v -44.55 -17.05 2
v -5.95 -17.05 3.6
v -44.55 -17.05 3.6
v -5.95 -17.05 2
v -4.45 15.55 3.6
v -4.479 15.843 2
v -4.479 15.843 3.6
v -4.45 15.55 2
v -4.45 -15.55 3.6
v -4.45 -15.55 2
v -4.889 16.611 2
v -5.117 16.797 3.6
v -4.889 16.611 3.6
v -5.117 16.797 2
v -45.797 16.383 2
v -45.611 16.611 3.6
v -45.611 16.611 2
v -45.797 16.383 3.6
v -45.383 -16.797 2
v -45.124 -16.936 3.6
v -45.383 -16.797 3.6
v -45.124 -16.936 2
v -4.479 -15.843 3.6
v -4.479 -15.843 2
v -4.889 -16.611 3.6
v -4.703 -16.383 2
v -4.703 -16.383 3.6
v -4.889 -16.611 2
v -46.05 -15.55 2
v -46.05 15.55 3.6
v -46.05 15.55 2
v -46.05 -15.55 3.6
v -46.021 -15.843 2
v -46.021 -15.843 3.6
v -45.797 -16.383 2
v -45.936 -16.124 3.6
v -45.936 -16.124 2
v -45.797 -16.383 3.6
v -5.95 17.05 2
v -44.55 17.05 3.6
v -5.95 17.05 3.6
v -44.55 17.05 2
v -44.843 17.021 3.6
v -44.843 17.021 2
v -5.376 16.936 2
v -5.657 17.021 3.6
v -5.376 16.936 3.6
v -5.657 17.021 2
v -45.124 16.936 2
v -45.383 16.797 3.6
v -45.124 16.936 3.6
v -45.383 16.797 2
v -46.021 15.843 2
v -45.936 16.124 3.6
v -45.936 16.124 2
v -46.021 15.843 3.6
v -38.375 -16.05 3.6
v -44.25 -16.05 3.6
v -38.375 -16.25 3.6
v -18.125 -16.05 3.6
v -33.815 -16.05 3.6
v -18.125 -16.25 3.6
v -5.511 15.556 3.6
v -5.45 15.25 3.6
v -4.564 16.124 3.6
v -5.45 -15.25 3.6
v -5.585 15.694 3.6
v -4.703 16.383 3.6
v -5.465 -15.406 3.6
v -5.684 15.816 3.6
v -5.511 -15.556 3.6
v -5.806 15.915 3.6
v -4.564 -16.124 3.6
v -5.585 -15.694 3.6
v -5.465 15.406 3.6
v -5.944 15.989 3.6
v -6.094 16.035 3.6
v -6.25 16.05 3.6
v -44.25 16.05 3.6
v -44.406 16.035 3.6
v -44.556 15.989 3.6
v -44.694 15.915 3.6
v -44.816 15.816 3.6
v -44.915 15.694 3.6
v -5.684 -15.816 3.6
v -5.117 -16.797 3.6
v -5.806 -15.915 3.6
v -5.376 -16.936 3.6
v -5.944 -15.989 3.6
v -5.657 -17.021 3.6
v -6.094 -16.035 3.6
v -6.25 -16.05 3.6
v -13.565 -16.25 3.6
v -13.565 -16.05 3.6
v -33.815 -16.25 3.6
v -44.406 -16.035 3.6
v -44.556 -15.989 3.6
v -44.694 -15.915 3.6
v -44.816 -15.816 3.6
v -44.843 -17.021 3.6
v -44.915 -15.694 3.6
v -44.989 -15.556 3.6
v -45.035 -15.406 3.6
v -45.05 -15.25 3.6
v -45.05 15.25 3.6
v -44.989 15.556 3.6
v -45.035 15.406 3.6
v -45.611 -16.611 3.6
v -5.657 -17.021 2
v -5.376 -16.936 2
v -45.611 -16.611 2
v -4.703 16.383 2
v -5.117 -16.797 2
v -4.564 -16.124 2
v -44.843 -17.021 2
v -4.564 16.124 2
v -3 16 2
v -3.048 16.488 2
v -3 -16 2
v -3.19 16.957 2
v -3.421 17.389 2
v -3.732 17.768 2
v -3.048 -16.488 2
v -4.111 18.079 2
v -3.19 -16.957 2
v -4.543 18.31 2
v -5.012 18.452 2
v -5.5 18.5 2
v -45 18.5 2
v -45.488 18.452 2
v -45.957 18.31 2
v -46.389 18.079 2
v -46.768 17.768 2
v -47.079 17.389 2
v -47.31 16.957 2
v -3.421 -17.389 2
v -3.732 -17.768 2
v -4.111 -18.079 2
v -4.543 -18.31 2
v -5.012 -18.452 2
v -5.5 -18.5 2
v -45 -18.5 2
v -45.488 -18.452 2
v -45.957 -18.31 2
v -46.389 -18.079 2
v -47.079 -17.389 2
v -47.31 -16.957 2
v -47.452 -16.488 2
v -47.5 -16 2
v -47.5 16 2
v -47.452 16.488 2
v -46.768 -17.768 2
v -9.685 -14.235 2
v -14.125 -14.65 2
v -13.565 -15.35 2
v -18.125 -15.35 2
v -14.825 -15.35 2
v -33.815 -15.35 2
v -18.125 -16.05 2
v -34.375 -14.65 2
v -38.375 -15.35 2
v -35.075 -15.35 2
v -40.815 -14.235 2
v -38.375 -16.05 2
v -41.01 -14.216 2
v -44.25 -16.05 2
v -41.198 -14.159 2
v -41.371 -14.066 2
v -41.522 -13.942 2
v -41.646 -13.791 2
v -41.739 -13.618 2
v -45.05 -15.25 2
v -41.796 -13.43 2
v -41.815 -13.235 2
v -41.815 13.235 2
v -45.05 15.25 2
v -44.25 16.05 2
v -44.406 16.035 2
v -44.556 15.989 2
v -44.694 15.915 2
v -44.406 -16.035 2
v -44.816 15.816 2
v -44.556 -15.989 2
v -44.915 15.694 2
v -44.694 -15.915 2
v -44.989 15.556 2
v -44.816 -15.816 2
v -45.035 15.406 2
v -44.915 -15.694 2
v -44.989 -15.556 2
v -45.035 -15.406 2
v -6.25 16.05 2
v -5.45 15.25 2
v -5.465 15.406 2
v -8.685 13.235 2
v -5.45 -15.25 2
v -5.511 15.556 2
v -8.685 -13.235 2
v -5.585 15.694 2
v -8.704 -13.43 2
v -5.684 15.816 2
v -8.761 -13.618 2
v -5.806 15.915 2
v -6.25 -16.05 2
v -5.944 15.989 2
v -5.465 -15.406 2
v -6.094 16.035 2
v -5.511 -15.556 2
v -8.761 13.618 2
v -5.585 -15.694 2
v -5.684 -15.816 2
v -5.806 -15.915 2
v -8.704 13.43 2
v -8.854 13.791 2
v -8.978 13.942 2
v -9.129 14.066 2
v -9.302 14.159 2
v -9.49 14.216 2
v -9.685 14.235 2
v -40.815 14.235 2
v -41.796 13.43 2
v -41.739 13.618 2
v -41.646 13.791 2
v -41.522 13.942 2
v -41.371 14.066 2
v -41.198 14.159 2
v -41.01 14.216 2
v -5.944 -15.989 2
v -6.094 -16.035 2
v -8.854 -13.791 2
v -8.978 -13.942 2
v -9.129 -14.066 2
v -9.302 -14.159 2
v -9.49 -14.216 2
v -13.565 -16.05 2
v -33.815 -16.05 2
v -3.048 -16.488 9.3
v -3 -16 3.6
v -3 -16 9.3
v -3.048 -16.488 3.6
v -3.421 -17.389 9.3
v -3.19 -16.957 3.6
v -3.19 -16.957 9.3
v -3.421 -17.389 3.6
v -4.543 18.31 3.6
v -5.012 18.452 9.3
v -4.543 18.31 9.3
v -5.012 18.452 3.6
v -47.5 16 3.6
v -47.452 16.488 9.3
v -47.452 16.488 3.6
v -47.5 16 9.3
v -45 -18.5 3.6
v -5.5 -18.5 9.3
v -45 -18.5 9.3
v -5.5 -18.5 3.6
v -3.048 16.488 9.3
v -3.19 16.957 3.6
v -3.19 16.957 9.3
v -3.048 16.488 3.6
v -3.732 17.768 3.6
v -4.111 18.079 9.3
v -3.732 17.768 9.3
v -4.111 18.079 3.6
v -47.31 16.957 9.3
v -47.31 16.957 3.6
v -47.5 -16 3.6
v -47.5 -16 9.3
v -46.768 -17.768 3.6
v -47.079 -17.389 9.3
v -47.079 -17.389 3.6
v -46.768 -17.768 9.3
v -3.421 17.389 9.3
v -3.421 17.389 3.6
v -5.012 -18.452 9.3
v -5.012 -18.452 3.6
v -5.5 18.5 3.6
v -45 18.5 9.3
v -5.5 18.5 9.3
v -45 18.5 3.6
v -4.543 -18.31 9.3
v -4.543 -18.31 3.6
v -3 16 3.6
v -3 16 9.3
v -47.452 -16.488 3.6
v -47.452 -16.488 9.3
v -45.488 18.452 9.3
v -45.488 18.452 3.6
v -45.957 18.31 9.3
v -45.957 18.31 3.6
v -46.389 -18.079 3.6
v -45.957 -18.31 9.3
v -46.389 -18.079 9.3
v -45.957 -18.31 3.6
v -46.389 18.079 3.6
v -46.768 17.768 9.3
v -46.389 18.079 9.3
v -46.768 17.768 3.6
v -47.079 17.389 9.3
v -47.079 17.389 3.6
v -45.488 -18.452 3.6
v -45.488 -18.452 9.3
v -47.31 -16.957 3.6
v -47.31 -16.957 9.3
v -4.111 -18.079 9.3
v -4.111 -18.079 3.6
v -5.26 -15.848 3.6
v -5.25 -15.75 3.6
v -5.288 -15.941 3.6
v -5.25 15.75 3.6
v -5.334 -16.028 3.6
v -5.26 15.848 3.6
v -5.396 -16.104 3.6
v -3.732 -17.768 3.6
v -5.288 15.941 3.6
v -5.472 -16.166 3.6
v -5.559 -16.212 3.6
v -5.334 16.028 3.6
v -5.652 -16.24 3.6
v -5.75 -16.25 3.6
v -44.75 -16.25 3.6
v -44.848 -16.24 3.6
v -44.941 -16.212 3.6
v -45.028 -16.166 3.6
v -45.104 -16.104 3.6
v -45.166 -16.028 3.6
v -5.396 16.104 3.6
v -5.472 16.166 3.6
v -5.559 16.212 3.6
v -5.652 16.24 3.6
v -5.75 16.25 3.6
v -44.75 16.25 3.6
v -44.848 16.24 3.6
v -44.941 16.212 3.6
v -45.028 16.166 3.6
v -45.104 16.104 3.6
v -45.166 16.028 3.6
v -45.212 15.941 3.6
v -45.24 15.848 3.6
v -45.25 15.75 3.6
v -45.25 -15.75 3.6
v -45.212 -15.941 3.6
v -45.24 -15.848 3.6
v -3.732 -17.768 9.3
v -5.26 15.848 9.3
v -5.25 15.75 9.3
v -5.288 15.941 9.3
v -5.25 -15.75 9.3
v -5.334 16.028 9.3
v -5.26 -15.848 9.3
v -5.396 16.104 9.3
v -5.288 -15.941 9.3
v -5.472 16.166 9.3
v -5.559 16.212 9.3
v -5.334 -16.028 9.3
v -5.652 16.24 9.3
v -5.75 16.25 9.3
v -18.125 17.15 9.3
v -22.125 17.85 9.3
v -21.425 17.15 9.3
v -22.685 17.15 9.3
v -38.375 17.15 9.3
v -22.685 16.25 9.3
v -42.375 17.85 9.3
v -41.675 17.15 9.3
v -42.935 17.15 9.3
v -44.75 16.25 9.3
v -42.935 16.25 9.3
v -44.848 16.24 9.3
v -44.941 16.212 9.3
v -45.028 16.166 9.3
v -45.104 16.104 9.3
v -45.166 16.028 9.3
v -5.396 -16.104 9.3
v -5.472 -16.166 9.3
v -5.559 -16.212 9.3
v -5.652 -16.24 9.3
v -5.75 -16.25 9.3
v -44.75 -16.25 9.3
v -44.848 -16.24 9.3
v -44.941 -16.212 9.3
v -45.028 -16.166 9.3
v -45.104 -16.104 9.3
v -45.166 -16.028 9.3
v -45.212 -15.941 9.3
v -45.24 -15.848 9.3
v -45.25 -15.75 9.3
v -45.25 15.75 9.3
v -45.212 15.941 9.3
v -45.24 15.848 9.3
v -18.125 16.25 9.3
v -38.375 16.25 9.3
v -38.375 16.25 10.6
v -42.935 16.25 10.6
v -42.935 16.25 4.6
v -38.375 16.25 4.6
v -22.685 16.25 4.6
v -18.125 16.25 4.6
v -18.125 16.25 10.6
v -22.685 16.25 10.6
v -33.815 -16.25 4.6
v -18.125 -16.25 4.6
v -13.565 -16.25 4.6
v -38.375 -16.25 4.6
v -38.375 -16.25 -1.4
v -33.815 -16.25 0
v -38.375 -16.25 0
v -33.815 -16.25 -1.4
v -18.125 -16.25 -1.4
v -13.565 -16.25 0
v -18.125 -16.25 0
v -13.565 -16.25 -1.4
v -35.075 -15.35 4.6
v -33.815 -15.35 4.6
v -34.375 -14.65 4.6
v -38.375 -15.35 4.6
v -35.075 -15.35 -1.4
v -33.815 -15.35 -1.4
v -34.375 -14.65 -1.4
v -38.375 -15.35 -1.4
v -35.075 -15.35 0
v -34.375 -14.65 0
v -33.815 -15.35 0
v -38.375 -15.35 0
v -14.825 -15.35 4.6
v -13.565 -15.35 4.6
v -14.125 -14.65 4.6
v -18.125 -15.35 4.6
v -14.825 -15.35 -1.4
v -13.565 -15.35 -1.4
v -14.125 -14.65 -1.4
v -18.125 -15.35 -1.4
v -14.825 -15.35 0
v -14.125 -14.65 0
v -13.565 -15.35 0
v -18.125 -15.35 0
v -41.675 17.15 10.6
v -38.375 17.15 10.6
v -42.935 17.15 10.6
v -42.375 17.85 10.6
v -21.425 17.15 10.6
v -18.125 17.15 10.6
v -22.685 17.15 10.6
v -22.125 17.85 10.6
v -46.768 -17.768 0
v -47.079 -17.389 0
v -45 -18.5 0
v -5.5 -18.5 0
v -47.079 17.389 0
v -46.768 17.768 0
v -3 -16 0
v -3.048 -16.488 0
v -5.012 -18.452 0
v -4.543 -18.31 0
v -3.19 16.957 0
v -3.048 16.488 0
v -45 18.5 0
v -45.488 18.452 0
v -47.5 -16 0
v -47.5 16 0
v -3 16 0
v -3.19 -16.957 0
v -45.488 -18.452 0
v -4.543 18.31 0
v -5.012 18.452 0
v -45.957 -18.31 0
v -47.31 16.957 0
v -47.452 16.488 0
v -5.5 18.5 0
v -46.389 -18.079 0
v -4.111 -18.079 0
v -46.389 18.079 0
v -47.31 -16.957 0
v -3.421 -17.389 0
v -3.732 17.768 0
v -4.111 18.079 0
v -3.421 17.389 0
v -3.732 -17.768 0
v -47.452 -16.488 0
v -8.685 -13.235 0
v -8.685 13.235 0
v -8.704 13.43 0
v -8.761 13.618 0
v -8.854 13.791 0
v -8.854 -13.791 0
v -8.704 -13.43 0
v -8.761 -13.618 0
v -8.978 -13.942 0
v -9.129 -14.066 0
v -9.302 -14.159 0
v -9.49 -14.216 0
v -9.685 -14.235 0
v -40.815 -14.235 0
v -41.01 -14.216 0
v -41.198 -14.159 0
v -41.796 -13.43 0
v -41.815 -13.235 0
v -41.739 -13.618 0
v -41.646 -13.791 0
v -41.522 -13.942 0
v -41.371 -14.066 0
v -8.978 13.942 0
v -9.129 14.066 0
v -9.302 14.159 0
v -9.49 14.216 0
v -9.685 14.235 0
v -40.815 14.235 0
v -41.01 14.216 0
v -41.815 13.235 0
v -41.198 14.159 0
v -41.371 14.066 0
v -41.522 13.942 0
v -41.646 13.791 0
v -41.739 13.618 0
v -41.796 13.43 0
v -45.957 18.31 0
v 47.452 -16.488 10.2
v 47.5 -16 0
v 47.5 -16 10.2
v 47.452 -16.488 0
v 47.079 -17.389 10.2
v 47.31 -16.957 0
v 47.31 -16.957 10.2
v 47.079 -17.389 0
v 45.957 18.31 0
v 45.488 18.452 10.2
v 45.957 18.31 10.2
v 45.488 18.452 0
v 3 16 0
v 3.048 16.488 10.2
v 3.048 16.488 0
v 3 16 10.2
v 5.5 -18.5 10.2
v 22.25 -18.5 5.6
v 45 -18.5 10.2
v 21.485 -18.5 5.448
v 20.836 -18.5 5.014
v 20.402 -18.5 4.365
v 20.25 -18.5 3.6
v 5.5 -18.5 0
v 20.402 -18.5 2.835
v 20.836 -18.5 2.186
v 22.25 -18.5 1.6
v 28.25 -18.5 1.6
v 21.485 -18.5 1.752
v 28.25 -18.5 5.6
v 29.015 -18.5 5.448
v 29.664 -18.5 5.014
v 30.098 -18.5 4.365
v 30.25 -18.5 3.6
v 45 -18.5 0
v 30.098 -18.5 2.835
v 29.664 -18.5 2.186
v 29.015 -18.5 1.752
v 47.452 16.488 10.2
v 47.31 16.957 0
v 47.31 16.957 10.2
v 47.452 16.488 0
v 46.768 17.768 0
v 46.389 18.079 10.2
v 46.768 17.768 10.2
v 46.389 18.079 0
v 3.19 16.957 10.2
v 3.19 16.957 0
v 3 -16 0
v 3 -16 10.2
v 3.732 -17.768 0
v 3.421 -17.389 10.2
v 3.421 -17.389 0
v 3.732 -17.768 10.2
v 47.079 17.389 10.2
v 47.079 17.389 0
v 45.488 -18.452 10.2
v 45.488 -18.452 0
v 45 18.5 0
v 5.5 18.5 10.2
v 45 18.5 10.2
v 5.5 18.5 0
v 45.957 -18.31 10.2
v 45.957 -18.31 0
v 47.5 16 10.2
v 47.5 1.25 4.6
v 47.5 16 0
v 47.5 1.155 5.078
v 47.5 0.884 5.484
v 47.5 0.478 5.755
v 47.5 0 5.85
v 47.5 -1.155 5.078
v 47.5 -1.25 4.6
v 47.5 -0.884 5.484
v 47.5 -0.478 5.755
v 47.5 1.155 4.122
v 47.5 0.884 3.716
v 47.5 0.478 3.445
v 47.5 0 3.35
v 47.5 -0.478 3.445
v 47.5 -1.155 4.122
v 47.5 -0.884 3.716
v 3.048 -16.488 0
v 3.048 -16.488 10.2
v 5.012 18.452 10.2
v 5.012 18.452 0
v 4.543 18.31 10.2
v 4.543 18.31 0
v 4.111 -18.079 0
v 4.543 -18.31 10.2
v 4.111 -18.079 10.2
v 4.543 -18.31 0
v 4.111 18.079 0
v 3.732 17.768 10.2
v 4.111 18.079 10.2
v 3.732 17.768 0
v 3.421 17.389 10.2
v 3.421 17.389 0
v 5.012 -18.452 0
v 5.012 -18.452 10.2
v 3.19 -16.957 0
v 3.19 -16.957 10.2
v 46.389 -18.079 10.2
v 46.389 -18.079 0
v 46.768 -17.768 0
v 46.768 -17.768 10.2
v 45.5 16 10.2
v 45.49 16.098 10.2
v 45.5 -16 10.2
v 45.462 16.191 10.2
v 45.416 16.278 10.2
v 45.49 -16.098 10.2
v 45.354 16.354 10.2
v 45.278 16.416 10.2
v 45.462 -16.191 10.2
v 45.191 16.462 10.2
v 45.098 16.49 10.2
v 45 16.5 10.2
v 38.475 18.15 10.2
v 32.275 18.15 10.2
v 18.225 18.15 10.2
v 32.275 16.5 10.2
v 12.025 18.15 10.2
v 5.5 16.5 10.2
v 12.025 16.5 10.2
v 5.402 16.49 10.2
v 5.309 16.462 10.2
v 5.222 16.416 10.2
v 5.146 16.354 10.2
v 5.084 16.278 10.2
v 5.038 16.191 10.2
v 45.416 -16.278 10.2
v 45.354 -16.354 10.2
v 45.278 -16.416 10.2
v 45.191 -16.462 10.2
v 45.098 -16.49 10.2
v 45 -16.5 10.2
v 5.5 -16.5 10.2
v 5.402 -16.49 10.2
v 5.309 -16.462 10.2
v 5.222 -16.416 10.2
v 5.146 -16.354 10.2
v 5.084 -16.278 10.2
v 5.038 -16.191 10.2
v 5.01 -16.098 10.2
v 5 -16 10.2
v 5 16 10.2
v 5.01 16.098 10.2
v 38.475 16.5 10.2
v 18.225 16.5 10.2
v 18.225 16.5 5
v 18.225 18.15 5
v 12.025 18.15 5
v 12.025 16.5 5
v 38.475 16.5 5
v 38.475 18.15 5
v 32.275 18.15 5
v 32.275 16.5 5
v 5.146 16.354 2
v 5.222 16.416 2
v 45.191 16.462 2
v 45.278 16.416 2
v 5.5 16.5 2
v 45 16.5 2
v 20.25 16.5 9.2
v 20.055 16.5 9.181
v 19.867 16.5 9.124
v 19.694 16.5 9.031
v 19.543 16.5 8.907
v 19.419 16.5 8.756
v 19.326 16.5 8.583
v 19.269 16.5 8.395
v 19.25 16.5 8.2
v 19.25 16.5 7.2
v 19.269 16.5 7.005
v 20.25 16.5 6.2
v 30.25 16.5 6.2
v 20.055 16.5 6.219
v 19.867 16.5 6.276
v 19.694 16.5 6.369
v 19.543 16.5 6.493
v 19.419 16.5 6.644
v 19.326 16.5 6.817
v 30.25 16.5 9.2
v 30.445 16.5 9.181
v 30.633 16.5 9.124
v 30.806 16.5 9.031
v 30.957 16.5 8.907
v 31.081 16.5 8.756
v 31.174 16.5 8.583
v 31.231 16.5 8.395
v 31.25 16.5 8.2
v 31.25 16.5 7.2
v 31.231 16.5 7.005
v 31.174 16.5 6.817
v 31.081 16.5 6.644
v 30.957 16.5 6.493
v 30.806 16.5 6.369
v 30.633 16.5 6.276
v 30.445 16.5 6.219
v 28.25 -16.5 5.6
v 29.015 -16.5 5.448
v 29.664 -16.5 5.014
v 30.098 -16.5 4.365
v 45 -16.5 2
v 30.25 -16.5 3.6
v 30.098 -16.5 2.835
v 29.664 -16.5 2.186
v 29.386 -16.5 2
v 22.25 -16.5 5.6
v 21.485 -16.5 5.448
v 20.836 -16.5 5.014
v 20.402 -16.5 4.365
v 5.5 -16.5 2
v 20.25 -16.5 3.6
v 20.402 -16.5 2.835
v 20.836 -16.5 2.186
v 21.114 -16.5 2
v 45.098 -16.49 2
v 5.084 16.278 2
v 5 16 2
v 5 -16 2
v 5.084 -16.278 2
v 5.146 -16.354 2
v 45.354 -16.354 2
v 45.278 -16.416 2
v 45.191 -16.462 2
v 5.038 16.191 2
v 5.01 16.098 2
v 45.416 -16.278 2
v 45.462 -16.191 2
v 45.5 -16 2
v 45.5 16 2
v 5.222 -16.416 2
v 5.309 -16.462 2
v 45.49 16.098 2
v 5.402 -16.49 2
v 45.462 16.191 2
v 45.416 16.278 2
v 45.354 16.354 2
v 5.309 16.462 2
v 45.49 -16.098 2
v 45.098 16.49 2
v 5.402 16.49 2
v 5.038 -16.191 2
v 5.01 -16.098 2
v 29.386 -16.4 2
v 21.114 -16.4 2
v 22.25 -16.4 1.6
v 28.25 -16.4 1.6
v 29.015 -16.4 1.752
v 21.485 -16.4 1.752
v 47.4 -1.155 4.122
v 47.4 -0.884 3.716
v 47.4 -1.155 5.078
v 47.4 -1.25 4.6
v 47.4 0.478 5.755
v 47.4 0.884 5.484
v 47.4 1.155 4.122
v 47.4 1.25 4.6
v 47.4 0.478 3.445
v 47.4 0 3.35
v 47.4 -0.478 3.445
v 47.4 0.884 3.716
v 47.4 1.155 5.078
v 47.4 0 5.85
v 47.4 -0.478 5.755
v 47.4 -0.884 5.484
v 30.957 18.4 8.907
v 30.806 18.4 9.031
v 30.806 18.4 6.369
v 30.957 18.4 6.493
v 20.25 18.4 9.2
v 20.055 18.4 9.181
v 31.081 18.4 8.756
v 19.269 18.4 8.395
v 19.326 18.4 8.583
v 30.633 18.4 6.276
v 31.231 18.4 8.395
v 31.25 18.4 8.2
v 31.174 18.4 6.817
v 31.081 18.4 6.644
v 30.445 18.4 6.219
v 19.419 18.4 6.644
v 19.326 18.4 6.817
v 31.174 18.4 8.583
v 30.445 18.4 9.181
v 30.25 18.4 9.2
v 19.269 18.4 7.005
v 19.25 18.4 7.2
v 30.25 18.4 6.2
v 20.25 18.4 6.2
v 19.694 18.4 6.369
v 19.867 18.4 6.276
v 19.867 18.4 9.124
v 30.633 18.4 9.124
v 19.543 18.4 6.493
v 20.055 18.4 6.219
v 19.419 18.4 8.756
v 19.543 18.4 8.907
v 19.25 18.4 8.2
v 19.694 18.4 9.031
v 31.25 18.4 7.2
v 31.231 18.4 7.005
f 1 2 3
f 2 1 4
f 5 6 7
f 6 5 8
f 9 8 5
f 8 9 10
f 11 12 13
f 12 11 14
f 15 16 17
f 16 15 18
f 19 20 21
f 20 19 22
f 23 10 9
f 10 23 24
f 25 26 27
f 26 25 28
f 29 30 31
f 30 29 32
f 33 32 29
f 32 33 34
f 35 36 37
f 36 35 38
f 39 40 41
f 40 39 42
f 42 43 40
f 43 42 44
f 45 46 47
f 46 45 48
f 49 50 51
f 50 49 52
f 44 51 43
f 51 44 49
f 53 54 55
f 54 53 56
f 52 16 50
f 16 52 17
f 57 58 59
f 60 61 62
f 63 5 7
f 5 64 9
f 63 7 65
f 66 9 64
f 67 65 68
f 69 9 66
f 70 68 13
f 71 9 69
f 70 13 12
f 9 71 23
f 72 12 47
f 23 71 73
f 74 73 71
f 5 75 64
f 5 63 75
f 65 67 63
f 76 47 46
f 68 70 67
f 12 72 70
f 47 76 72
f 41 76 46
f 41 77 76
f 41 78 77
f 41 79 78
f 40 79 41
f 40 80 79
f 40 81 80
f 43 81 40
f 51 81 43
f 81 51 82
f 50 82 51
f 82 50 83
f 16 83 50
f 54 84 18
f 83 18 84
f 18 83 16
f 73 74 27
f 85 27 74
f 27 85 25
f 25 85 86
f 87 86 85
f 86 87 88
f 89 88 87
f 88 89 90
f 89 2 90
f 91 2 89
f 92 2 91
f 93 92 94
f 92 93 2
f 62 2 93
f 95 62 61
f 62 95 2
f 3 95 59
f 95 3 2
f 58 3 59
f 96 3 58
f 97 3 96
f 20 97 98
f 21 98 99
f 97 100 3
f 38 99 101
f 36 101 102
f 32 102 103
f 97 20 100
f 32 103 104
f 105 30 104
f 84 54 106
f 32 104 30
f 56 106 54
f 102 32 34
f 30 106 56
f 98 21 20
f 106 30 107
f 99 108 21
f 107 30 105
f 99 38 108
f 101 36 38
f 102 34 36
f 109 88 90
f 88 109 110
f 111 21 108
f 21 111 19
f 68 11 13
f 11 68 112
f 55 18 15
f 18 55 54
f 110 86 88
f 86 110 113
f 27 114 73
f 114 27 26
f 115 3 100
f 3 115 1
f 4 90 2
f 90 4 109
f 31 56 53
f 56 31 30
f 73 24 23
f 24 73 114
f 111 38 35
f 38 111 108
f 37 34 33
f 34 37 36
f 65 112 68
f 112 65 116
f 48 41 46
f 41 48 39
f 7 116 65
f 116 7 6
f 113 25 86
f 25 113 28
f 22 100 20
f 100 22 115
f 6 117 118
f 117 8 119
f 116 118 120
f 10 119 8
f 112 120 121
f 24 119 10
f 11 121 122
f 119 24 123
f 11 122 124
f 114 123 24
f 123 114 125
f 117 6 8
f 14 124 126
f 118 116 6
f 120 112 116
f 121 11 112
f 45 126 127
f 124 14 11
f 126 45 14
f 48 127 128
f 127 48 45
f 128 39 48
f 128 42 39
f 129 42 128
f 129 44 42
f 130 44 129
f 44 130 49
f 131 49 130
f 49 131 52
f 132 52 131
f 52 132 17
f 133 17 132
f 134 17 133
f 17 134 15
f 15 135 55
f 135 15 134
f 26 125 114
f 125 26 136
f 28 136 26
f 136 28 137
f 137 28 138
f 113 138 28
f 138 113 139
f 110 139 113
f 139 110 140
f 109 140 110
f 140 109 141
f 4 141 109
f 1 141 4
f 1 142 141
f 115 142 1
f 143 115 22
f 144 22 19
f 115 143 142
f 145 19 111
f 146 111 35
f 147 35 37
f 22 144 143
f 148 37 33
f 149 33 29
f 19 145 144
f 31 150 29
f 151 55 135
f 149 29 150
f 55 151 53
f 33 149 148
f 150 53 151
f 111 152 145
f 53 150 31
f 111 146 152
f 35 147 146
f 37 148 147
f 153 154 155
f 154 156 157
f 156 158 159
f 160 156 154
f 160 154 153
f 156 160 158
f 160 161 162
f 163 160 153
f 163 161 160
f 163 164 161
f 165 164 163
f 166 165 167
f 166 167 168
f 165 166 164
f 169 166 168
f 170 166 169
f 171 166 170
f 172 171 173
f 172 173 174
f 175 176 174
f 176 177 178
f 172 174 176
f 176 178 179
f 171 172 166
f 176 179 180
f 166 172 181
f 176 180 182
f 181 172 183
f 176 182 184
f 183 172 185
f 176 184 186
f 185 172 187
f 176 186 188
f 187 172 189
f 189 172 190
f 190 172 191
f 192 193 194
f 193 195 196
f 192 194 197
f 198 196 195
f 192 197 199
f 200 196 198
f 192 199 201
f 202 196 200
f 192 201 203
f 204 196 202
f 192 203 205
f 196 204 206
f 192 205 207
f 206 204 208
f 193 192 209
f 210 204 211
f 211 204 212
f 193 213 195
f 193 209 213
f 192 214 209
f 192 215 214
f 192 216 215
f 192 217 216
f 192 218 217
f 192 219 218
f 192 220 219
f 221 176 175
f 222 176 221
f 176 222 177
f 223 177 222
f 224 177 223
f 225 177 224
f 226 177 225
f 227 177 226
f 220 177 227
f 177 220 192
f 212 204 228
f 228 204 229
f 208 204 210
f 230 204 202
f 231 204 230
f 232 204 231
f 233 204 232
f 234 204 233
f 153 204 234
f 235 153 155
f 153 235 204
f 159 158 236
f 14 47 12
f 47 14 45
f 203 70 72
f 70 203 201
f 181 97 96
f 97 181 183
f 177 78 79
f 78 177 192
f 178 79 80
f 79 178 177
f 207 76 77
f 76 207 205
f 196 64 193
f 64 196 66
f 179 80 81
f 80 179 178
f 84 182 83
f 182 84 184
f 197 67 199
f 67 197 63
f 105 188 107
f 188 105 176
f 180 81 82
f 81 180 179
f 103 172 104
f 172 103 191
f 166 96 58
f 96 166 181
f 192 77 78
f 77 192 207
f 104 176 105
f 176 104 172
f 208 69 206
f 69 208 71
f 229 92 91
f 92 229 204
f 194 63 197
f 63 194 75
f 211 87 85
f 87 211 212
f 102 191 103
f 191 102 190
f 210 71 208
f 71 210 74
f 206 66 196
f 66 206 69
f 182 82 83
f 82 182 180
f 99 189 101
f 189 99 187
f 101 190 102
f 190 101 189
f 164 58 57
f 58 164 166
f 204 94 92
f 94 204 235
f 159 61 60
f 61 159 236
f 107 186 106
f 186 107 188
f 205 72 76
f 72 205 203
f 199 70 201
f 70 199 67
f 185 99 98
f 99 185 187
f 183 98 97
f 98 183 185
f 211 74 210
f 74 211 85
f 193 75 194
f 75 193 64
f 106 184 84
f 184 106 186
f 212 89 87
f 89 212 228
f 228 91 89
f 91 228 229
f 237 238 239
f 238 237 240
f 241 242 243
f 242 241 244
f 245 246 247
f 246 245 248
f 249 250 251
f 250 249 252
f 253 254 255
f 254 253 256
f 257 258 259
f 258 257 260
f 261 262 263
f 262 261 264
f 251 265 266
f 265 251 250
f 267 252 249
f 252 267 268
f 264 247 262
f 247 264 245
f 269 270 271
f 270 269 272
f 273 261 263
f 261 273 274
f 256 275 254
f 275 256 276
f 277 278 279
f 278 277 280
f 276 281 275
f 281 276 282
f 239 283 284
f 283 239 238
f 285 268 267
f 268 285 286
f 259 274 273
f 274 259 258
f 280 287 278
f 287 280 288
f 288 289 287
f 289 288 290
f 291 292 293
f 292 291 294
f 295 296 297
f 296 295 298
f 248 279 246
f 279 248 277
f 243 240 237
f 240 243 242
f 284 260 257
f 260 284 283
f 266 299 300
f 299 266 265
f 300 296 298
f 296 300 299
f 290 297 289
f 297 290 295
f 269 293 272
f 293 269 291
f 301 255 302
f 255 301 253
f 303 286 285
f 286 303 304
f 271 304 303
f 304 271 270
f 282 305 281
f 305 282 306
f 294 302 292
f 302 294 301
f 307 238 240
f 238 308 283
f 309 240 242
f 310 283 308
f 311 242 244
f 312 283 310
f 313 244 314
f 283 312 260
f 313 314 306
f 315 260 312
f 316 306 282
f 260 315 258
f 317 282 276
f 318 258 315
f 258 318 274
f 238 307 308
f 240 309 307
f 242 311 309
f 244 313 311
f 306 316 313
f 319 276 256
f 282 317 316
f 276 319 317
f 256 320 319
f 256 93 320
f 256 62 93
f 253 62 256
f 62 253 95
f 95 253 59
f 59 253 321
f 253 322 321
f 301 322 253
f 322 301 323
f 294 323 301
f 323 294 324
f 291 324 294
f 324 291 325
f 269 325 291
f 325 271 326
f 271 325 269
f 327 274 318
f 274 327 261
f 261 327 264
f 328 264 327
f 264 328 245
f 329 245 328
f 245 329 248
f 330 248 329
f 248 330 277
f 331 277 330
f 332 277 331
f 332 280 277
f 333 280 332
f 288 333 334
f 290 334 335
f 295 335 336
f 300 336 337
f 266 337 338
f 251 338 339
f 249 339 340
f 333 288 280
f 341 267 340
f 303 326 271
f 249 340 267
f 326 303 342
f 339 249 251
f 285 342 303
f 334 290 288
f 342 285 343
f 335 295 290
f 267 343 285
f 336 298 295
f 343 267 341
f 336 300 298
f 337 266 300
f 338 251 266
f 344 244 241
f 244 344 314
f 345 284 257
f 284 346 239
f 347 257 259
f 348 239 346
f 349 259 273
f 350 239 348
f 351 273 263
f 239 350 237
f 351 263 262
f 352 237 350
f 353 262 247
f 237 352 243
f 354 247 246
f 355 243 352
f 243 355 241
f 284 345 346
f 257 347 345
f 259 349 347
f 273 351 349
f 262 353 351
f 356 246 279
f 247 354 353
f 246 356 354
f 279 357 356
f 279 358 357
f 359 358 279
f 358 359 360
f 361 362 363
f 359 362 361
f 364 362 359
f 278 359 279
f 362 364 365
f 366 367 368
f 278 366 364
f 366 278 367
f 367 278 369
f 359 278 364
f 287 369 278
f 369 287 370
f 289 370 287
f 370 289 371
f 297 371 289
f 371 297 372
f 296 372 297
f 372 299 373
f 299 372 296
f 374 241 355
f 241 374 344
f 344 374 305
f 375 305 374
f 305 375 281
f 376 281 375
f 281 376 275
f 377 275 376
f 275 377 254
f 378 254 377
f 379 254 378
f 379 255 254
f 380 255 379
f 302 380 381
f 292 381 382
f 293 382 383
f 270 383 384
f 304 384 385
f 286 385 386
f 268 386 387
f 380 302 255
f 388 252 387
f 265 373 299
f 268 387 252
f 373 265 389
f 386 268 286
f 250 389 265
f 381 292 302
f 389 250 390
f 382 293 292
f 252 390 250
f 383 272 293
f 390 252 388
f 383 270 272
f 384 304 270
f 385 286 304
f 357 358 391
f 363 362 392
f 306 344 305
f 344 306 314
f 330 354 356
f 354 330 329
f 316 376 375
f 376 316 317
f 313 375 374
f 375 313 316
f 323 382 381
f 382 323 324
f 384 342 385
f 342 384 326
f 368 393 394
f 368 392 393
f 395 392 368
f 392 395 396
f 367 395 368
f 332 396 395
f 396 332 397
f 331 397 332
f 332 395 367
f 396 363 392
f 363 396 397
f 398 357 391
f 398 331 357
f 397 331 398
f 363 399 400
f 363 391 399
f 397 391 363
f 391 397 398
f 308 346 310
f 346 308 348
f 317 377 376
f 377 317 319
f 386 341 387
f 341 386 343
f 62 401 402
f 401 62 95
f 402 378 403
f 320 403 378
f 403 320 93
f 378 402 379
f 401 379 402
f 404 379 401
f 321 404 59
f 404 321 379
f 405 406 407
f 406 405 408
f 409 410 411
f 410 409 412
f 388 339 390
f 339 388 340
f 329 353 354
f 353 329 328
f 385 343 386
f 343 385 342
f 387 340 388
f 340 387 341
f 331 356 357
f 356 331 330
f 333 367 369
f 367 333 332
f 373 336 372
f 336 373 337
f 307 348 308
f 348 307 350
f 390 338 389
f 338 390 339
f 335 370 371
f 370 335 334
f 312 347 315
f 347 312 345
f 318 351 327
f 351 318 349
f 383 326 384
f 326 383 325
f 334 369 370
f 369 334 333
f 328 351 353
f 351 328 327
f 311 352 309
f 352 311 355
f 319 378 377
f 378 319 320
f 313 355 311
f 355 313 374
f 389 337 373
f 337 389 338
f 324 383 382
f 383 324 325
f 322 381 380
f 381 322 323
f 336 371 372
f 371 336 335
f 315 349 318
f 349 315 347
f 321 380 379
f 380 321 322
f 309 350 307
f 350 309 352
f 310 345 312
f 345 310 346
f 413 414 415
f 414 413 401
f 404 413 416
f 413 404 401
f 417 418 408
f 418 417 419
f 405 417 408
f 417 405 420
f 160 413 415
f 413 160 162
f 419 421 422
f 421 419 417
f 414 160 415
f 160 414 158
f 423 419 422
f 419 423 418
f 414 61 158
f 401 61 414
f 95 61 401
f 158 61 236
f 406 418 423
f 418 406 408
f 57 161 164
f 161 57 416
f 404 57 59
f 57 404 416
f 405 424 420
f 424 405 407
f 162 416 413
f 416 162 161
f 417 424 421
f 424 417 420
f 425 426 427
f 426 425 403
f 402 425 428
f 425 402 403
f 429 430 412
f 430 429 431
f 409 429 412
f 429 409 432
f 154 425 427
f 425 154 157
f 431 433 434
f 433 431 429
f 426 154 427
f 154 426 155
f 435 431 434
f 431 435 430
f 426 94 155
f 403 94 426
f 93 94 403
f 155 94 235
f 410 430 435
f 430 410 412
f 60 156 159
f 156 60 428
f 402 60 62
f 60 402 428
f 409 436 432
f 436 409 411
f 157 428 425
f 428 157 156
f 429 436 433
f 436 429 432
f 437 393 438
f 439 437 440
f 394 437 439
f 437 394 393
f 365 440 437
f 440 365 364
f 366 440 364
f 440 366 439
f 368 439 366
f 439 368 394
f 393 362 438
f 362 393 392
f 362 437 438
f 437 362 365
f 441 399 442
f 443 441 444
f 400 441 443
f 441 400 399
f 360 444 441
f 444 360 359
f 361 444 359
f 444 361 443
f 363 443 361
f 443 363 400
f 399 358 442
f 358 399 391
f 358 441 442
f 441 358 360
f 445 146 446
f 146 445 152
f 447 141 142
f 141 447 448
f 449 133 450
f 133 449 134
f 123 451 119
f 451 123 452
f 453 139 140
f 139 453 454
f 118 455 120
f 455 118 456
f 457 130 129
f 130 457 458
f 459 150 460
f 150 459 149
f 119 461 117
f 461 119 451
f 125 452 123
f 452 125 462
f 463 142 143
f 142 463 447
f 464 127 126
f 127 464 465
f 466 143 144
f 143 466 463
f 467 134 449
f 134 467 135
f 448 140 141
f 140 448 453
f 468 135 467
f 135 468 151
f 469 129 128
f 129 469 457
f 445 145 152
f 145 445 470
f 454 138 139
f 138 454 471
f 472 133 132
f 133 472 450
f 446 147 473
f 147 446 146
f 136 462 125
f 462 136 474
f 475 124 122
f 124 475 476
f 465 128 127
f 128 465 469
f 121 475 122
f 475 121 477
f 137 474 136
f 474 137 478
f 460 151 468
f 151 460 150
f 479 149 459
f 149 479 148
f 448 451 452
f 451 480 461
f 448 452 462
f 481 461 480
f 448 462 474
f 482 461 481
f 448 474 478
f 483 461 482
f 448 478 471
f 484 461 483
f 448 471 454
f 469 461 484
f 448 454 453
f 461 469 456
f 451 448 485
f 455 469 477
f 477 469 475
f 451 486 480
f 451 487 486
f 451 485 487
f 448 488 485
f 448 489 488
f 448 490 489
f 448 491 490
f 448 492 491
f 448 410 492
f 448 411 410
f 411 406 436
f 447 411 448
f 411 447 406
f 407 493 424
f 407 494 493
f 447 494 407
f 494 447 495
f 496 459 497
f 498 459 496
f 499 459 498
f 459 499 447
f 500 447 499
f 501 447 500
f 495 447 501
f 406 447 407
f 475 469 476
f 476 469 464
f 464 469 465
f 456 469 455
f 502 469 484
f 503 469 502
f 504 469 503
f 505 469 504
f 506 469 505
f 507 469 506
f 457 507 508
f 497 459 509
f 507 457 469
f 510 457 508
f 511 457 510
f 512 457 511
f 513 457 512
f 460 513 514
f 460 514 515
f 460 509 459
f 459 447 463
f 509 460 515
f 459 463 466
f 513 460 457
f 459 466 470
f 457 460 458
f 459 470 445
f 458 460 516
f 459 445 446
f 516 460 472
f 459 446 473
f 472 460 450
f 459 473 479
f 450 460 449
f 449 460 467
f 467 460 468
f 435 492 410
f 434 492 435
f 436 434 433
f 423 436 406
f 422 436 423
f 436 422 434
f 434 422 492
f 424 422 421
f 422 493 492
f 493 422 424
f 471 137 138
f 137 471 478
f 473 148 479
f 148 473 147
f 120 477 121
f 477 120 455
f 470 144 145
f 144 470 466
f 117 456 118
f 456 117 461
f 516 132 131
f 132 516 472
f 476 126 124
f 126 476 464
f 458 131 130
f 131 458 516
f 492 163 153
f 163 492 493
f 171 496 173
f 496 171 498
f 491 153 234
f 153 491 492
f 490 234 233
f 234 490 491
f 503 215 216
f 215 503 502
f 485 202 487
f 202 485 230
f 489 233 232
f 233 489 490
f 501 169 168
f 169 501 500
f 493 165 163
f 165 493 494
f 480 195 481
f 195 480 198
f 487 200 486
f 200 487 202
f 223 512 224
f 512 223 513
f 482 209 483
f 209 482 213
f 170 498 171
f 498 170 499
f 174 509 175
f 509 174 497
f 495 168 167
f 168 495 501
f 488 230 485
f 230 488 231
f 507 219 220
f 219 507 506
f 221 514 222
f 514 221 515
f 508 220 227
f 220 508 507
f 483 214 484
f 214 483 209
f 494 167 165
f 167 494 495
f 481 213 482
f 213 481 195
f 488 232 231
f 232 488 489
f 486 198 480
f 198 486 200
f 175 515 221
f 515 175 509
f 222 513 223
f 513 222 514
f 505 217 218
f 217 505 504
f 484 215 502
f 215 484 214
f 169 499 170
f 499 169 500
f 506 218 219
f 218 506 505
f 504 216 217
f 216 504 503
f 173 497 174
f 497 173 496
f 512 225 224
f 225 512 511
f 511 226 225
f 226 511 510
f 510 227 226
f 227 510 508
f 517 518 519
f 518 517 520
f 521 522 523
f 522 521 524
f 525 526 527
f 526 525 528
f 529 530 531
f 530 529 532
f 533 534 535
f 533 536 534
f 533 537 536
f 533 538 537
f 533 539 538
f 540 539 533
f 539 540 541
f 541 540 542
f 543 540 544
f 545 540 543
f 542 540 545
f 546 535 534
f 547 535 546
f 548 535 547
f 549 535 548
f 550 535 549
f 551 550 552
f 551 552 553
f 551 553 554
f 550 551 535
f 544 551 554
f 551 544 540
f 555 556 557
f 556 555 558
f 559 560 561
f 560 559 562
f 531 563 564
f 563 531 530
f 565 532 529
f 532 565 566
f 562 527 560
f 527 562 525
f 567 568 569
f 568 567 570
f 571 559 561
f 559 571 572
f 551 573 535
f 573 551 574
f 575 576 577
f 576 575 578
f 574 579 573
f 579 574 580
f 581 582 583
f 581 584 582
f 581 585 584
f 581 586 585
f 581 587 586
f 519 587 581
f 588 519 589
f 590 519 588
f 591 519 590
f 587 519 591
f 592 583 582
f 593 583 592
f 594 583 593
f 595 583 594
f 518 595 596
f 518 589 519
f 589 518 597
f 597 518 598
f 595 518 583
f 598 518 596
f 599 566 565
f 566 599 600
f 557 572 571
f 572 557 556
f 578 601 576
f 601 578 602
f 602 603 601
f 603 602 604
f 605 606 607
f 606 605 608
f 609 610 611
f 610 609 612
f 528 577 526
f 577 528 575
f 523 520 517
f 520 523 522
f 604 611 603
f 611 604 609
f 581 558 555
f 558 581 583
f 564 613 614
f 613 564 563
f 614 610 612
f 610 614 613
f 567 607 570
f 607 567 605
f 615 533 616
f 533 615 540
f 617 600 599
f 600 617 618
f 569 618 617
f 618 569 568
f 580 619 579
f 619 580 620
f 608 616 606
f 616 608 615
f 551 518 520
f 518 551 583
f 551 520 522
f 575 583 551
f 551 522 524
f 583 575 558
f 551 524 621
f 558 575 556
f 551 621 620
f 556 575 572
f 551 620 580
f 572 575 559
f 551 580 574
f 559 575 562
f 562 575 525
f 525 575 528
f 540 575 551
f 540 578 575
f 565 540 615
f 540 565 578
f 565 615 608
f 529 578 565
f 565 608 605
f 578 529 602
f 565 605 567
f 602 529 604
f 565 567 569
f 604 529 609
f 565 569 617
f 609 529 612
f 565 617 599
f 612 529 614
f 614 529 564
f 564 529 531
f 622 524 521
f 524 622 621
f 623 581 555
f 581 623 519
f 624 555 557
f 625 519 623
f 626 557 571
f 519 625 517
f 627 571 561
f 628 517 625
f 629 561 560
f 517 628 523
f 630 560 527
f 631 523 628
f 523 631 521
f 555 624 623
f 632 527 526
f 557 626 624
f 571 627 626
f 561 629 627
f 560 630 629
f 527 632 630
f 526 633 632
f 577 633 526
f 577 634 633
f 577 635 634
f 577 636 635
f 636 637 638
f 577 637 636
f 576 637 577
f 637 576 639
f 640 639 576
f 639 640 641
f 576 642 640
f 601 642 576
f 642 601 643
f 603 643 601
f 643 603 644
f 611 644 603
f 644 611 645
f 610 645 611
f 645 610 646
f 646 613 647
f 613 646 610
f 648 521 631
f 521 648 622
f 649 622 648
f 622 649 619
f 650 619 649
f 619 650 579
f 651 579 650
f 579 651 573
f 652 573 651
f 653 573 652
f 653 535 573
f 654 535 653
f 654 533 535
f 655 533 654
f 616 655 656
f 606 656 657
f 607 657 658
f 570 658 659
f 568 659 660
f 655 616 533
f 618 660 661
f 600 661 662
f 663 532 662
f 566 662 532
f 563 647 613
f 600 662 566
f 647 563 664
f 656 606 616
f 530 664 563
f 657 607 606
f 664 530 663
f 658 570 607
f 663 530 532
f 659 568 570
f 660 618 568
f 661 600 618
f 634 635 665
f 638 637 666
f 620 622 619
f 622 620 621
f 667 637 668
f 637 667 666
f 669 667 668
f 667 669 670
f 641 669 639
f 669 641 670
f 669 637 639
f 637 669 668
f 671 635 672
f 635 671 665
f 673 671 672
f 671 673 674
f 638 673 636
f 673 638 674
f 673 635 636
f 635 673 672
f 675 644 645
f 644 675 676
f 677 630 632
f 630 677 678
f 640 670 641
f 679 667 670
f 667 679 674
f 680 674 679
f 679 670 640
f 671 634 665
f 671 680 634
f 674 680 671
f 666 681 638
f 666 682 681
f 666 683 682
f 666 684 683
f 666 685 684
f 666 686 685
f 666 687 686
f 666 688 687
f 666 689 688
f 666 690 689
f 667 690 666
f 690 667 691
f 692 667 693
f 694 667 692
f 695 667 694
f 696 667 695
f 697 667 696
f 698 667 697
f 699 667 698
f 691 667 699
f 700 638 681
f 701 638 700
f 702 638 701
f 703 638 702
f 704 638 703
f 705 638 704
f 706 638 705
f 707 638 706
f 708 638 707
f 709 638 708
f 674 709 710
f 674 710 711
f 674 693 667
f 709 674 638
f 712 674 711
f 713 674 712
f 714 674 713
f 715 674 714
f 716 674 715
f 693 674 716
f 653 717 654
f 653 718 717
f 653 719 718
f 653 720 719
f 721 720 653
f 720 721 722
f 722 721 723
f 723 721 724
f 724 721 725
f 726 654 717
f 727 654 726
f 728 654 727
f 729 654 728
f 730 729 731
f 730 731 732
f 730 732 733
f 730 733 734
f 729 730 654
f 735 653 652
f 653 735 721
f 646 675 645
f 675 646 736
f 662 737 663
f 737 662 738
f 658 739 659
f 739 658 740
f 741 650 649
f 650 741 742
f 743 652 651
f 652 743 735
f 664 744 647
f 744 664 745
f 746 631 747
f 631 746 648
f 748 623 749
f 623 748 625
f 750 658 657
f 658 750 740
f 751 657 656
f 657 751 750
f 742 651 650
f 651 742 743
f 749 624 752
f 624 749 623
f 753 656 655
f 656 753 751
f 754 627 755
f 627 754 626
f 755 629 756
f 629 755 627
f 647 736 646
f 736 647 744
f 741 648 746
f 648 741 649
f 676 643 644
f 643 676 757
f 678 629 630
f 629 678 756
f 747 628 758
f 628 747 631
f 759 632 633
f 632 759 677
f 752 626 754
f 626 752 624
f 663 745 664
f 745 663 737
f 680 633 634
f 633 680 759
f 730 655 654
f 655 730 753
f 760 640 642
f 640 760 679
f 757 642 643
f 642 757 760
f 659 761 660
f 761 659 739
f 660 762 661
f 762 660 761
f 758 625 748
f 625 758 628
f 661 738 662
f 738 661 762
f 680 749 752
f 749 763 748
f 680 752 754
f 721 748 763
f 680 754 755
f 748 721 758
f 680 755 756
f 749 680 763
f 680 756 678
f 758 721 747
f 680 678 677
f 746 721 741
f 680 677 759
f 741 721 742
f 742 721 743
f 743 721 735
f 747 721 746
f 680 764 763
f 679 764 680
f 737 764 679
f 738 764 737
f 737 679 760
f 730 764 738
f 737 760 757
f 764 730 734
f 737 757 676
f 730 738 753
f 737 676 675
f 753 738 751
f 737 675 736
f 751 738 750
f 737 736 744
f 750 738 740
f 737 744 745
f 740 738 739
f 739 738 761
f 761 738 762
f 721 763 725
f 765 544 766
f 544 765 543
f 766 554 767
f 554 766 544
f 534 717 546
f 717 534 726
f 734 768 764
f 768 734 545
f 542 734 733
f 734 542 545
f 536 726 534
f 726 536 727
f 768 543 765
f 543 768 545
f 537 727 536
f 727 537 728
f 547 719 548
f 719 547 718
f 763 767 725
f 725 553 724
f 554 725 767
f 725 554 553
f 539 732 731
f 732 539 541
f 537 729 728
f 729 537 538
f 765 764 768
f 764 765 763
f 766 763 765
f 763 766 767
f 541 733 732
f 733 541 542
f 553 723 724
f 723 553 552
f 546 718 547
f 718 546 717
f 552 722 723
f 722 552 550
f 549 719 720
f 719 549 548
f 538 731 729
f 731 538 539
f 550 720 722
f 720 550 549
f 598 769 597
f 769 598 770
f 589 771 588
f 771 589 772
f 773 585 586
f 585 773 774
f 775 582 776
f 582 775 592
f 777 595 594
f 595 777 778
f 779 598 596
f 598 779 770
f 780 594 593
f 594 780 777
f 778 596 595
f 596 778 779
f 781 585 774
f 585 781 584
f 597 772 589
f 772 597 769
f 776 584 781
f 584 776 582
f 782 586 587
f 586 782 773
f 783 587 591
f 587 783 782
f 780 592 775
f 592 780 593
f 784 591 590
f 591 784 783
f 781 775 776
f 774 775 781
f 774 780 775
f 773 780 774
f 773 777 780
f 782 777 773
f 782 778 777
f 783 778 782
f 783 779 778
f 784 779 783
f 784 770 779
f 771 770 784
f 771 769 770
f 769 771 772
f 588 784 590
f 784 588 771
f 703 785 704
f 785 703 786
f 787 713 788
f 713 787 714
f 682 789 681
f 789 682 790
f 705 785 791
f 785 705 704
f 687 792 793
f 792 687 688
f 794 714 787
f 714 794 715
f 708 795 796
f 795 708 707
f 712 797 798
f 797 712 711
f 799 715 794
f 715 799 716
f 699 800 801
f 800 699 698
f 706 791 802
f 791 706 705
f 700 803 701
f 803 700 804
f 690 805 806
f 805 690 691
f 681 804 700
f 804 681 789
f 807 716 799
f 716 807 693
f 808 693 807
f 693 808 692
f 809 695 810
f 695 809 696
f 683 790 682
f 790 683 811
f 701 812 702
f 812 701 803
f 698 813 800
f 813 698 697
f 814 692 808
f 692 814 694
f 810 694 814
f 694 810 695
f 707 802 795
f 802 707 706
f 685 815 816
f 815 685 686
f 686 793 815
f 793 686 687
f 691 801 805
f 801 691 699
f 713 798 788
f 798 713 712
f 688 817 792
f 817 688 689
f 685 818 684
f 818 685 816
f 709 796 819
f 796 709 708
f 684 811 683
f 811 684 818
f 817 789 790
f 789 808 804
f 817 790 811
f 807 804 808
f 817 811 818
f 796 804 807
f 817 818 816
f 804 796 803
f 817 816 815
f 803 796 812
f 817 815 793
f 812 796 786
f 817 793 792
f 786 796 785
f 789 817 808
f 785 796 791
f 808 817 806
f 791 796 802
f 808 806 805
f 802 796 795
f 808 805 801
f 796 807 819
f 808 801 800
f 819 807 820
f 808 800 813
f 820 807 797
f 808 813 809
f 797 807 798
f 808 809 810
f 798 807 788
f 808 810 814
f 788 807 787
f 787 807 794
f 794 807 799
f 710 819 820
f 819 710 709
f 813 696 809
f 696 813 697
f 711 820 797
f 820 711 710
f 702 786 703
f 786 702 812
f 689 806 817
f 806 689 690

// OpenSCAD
// ============================================================
// ST7789 1.69" (Landscape) + Nice!Nano v2  –  Dongle Cube Case
// ============================================================
//
// 설명: ST7789 1.69인치 디스플레이(가로 방향)와 나이스나노 v2를 위한
//       2파트 스냅핏 3D 프린트 케이스.
//
// Description: Two-part snap-fit 3D-printable enclosure for the
//   ST7789 1.69" display (landscape / horizontal) and Nice!Nano v2.
//
// Print settings / 출력 설정:
//   • Top shell  → print face-DOWN (display side on build plate)
//   • Bottom shell → print as-is (open side up)
//   • Layer height : 0.2 mm
//   • Infill       : 15 %
//   • Supports     : none required
//
// Assembly / 조립 순서:
//   1. Wire the ST7789 to the Nice!Nano v2 (SPI).
//   2. Press the display PCB into the top-shell window from inside.
//   3. Tuck the Nice!Nano v2 into the bottom-shell PCB seat.
//   4. Route the wires and press the two shells together.
//
// Units: mm
// ============================================================

/* [What to render / 렌더링 선택] */
// 0 = both parts side-by-side  |  1 = top shell only  |  2 = bottom shell only
SHOW = 0; // [0:Both, 1:Top shell, 2:Bottom shell]

/* ── Component dimensions / 컴포넌트 치수 ────────────────────── */

// ST7789 1.69" module  (landscape = PCB rotated 90°)
// PCB  portrait: 31.5 mm tall × 39.0 mm wide  →  landscape: W × H
DISP_PCB_W      = 39.0;   // display PCB width  (landscape long side)  [mm]
DISP_PCB_H      = 31.5;   // display PCB height (landscape short side) [mm]
DISP_PCB_T      = 1.2;    // PCB + glass stack thickness                [mm]
DISP_ACTIVE_W   = 32.63;  // active / viewing area width (landscape)   [mm]
DISP_ACTIVE_H   = 27.97;  // active / viewing area height (landscape)  [mm]
DISP_CONN_H     = 3.0;    // FPC connector height protruding below PCB [mm]

// Nice!Nano v2
NN_W            = 34.1;   // PCB width  [mm]
NN_H            = 18.3;   // PCB height [mm]
NN_PCB_T        = 1.6;    // PCB thickness [mm]
NN_TOTAL_T      = 3.2;    // incl. mid-mount USB-C connector on top     [mm]
NN_USBC_W       = 9.5;    // USB-C receptacle opening width             [mm]
NN_USBC_H       = 3.5;    // USB-C receptacle opening height            [mm]
// USB-C sits on the top long edge of the Nice!Nano; centred along width.

/* ── Case parameters / 케이스 파라미터 ──────────────────────── */
WALL            = 2.0;    // shell wall thickness  [mm]
FLOOR           = 2.0;    // bottom floor thickness [mm]
TOLERANCE       = 0.25;   // print-fit clearance on each side [mm]
CORNER_R        = 2.5;    // outer corner radius  [mm]

// Internal clearances around components
DISP_CLR        = 0.3;    // clearance around display PCB edges [mm]
NN_CLR          = 0.4;    // clearance around Nice!Nano PCB     [mm]

// Snap-fit tongue parameters
SNAP_W          = 6.0;    // snap tab width   [mm]
SNAP_T          = 0.9;    // snap tab thickness (flexes) [mm]
SNAP_CATCH      = 0.7;    // undercut depth   [mm]
SNAP_H          = 4.0;    // snap tab height  [mm]
NUM_SNAPS       = 2;      // snaps on each long side

// MCU guide rail parameters / MCU 가이드 파라미터
MCU_GUIDE_WALL  = 1.0;    // guide rail wall thickness [mm]
MCU_GUIDE_H     = 3.0;    // guide rail height         [mm]

/* ── Derived dimensions / 파생 치수 ─────────────────────────── */
// Cavity is sized for the display PCB (widest component in W direction)
INNER_W = max(DISP_PCB_W, NN_W) + 2 * (TOLERANCE + 0.5); // ~42 mm
INNER_H = DISP_PCB_H             + 2 * (TOLERANCE + 0.5); // ~34 mm

// Depth breakdown (inside the closed case):
//   top-shell ledge (display PCB) + air gap + Nice!Nano stack
LEDGE_D  = DISP_PCB_T + 0.4;                // pocket in top shell for display PCB
WIRE_GAP = 5.0;                              // wiring / air gap between PCBs
INNER_D  = LEDGE_D + WIRE_GAP + NN_TOTAL_T; // total inner depth ~10 mm

// Top-shell dimensions
TOP_H    = LEDGE_D + WALL;   // thin: just enough for display PCB pocket
// Bottom-shell dimensions
BOT_H    = INNER_D - LEDGE_D + FLOOR;       // rest of the depth + floor

OUTER_W  = INNER_W + 2 * WALL;
OUTER_H  = INNER_H + 2 * WALL;

// Nice!Nano seat position inside bottom shell (centred W, centred H)
NN_SEAT_X = (INNER_W - NN_W) / 2;
NN_SEAT_Y = (INNER_H - NN_H) / 2;

// USB-C cutout position on the BOTTOM edge of the bottom shell
// The Nice!Nano USB-C faces the BOTTOM edge of the case (short side)
USBC_OFFSET_Z = FLOOR + NN_TOTAL_T / 2; // height of USB-C centre from floor

/* ── Helper modules / 헬퍼 모듈 ─────────────────────────────── */

// Rounded rectangular prism (centred at XY origin, Z starts at 0)
module rbox(w, h, d, r = CORNER_R) {
    r_clamped = min(r, w / 2 - 0.01, h / 2 - 0.01);
    hull()
        for (sx = [-1, 1], sy = [-1, 1])
            translate([sx * (w / 2 - r_clamped), sy * (h / 2 - r_clamped), 0])
                cylinder(r = r_clamped, h = d, $fn = 32);
}

// Rounded rectangle 2-D (used with linear_extrude)
module rrect(w, h, r = CORNER_R) {
    r_clamped = min(r, w / 2 - 0.01, h / 2 - 0.01);
    hull()
        for (sx = [-1, 1], sy = [-1, 1])
            translate([sx * (w / 2 - r_clamped), sy * (h / 2 - r_clamped)])
                circle(r = r_clamped, $fn = 32);
}

// Snap tongue protruding inward (along -X, centred at origin)
// Used on top-shell inner skirt; bottom-shell has matching groove.
module snap_tongue(protruding_side = "left") {
    // tongue points INWARD (+X) – caller rotates/mirrors as needed
    linear_extrude(SNAP_W)
        polygon([
            [0,          0],
            [SNAP_T,     0],
            [SNAP_T,     SNAP_H - SNAP_CATCH],
            [SNAP_T + SNAP_CATCH, SNAP_H],
            [SNAP_T,     SNAP_H + SNAP_CATCH * 0.8],
            [0,          SNAP_H + SNAP_CATCH * 0.8]
        ]);
}

/* ── Top shell / 상단 쉘 (display side) ─────────────────────── */
module top_shell() {
    difference() {
        union() {
            // ── Outer face plate ────────────────────────────────
            rbox(OUTER_W, OUTER_H, WALL, r = CORNER_R);

            // ── Display PCB ledge rim (pocket walls, from inside face) ──
            // Creates a shallow rim the display PCB rests on.
            translate([0, 0, WALL])
                difference() {
                    rbox(DISP_PCB_W + 2 * DISP_CLR + 2 * 1.0,
                         DISP_PCB_H + 2 * DISP_CLR + 2 * 1.0,
                         LEDGE_D, r = 1.5);
                    translate([0, 0, -0.1])
                        rbox(DISP_PCB_W + 2 * DISP_CLR,
                             DISP_PCB_H + 2 * DISP_CLR,
                             LEDGE_D + 0.2, r = 0.8);
                }

            // ── Inner skirt (slides over bottom-shell walls) ────
            translate([0, 0, WALL + LEDGE_D])
                difference() {
                    rbox(OUTER_W, OUTER_H, SNAP_H + SNAP_CATCH + 1.0, r = CORNER_R);
                    translate([0, 0, -0.1])
                        rbox(INNER_W - 2 * TOLERANCE,
                             INNER_H - 2 * TOLERANCE,
                             SNAP_H + SNAP_CATCH + 1.2, r = CORNER_R - WALL);
                }

            // ── Snap tongues on long sides ───────────────────────
            snap_z = WALL + LEDGE_D + 1.0;
            for (side = [-1, 1])
                for (i = [0 : NUM_SNAPS - 1]) {
                    x_pos = (i - (NUM_SNAPS - 1) / 2) * (INNER_W / (NUM_SNAPS));
                    translate([x_pos - SNAP_W / 2,
                               side * (INNER_H / 2 - TOLERANCE),
                               snap_z])
                        rotate([side > 0 ? 0 : 180, 0, 90])
                            snap_tongue();
                }
        }

        // ── Display viewing window ──────────────────────────────
        translate([0, 0, -0.1])
            rbox(DISP_ACTIVE_W + 2 * TOLERANCE,
                 DISP_ACTIVE_H + 2 * TOLERANCE,
                 WALL + 0.2, r = 1.0);
    }
}

/* ── Bottom shell / 하단 쉘 (electronics side) ─────────────── */
module bottom_shell() {
    difference() {
        union() {
            // ── Main outer body ─────────────────────────────────
            rbox(OUTER_W, OUTER_H, BOT_H, r = CORNER_R);

            // ── Nice!Nano PCB seat risers ────────────────────────
            // Four corner posts that raise the Nice!Nano PCB off the floor
            // so the USB-C connector side faces the opening edge cleanly.
            translate([-INNER_W / 2 + NN_SEAT_X,
                       -INNER_H / 2 + NN_SEAT_Y,
                        FLOOR]) {
                for (cx = [1, NN_W - 1])
                    for (cy = [1, NN_H - 1])
                        translate([cx, cy, 0])
                            cylinder(d = 2.4, h = 1.5, $fn = 16);
            }

            // ── Nice!Nano MCU guide rails ────────────────────────
            // Rectangular frame around the MCU footprint to prevent
            // lateral movement during use.
            translate([-INNER_W / 2 + NN_SEAT_X - MCU_GUIDE_WALL,
                       -INNER_H / 2 + NN_SEAT_Y - MCU_GUIDE_WALL,
                        FLOOR])
                difference() {
                    cube([NN_W + 2 * MCU_GUIDE_WALL,
                          NN_H + 2 * MCU_GUIDE_WALL,
                          MCU_GUIDE_H]);
                    translate([MCU_GUIDE_WALL, MCU_GUIDE_WALL, -0.1])
                        cube([NN_W, NN_H, MCU_GUIDE_H + 0.2]);
                }
        }

        // ── Inner cavity ────────────────────────────────────────
        translate([0, 0, FLOOR])
            rbox(INNER_W, INNER_H, BOT_H, r = CORNER_R - WALL);

        // ── Snap-fit grooves on long-side walls ─────────────────
        // Matching recesses for top-shell tongues
        snap_z = BOT_H - SNAP_H - SNAP_CATCH - 0.5;
        for (side = [-1, 1])
            for (i = [0 : NUM_SNAPS - 1]) {
                x_pos = (i - (NUM_SNAPS - 1) / 2) * (INNER_W / (NUM_SNAPS));
                translate([x_pos - SNAP_W / 2 - 0.1,
                           side * (OUTER_H / 2 - WALL - TOLERANCE),
                           snap_z])
                    cube([SNAP_W + 0.2,
                          SNAP_T + SNAP_CATCH + 0.3,
                          SNAP_H + SNAP_CATCH + 0.8]);
            }

        // ── USB-C port cutout ────────────────────────────────────
        // On the FRONT short wall of the case (−Y side), centred.
        // The Nice!Nano USB-C faces this direction.
        translate([0,
                   -(OUTER_H / 2) - 0.1,
                   USBC_OFFSET_Z])
            rotate([-90, 0, 0])
                hull()
                    for (dx = [-1, 1])
                        translate([dx * (NN_USBC_W / 2 - NN_USBC_H / 2), 0, 0])
                            cylinder(d = NN_USBC_H + 2 * TOLERANCE,
                                     h = WALL + 0.2, $fn = 16);

        // ── Status LED window (optional tiny window on side wall) ──
        // Cut a 2.5 mm circle on the right short wall for the power LED.
        translate([OUTER_W / 2 - 0.1,
                   0,
                   FLOOR + NN_TOTAL_T / 2 + 1])
            rotate([0, 90, 0])
                cylinder(d = 2.5, h = WALL + 0.2, $fn = 16);

        // ── Ventilation / cable pass-through slot on back wall ──
        // 12 × 3 mm slot at the top of the back (+ Y) wall.
        translate([0,
                   OUTER_H / 2 - 0.1,
                   FLOOR + NN_TOTAL_T + WIRE_GAP / 2])
            rotate([90, 0, 0])
                rbox(12, 3, WALL + 0.2, r = 1.0);
    }
}

/* ── Render / 렌더링 ─────────────────────────────────────────── */
if (SHOW == 0) {
    // Both parts side-by-side for a layout view
    translate([-(OUTER_W / 2 + 3), 0, 0]) top_shell();
    translate([  OUTER_W / 2 + 3,  0, 0]) bottom_shell();
} else if (SHOW == 1) {
    top_shell();
} else {
    bottom_shell();
}
